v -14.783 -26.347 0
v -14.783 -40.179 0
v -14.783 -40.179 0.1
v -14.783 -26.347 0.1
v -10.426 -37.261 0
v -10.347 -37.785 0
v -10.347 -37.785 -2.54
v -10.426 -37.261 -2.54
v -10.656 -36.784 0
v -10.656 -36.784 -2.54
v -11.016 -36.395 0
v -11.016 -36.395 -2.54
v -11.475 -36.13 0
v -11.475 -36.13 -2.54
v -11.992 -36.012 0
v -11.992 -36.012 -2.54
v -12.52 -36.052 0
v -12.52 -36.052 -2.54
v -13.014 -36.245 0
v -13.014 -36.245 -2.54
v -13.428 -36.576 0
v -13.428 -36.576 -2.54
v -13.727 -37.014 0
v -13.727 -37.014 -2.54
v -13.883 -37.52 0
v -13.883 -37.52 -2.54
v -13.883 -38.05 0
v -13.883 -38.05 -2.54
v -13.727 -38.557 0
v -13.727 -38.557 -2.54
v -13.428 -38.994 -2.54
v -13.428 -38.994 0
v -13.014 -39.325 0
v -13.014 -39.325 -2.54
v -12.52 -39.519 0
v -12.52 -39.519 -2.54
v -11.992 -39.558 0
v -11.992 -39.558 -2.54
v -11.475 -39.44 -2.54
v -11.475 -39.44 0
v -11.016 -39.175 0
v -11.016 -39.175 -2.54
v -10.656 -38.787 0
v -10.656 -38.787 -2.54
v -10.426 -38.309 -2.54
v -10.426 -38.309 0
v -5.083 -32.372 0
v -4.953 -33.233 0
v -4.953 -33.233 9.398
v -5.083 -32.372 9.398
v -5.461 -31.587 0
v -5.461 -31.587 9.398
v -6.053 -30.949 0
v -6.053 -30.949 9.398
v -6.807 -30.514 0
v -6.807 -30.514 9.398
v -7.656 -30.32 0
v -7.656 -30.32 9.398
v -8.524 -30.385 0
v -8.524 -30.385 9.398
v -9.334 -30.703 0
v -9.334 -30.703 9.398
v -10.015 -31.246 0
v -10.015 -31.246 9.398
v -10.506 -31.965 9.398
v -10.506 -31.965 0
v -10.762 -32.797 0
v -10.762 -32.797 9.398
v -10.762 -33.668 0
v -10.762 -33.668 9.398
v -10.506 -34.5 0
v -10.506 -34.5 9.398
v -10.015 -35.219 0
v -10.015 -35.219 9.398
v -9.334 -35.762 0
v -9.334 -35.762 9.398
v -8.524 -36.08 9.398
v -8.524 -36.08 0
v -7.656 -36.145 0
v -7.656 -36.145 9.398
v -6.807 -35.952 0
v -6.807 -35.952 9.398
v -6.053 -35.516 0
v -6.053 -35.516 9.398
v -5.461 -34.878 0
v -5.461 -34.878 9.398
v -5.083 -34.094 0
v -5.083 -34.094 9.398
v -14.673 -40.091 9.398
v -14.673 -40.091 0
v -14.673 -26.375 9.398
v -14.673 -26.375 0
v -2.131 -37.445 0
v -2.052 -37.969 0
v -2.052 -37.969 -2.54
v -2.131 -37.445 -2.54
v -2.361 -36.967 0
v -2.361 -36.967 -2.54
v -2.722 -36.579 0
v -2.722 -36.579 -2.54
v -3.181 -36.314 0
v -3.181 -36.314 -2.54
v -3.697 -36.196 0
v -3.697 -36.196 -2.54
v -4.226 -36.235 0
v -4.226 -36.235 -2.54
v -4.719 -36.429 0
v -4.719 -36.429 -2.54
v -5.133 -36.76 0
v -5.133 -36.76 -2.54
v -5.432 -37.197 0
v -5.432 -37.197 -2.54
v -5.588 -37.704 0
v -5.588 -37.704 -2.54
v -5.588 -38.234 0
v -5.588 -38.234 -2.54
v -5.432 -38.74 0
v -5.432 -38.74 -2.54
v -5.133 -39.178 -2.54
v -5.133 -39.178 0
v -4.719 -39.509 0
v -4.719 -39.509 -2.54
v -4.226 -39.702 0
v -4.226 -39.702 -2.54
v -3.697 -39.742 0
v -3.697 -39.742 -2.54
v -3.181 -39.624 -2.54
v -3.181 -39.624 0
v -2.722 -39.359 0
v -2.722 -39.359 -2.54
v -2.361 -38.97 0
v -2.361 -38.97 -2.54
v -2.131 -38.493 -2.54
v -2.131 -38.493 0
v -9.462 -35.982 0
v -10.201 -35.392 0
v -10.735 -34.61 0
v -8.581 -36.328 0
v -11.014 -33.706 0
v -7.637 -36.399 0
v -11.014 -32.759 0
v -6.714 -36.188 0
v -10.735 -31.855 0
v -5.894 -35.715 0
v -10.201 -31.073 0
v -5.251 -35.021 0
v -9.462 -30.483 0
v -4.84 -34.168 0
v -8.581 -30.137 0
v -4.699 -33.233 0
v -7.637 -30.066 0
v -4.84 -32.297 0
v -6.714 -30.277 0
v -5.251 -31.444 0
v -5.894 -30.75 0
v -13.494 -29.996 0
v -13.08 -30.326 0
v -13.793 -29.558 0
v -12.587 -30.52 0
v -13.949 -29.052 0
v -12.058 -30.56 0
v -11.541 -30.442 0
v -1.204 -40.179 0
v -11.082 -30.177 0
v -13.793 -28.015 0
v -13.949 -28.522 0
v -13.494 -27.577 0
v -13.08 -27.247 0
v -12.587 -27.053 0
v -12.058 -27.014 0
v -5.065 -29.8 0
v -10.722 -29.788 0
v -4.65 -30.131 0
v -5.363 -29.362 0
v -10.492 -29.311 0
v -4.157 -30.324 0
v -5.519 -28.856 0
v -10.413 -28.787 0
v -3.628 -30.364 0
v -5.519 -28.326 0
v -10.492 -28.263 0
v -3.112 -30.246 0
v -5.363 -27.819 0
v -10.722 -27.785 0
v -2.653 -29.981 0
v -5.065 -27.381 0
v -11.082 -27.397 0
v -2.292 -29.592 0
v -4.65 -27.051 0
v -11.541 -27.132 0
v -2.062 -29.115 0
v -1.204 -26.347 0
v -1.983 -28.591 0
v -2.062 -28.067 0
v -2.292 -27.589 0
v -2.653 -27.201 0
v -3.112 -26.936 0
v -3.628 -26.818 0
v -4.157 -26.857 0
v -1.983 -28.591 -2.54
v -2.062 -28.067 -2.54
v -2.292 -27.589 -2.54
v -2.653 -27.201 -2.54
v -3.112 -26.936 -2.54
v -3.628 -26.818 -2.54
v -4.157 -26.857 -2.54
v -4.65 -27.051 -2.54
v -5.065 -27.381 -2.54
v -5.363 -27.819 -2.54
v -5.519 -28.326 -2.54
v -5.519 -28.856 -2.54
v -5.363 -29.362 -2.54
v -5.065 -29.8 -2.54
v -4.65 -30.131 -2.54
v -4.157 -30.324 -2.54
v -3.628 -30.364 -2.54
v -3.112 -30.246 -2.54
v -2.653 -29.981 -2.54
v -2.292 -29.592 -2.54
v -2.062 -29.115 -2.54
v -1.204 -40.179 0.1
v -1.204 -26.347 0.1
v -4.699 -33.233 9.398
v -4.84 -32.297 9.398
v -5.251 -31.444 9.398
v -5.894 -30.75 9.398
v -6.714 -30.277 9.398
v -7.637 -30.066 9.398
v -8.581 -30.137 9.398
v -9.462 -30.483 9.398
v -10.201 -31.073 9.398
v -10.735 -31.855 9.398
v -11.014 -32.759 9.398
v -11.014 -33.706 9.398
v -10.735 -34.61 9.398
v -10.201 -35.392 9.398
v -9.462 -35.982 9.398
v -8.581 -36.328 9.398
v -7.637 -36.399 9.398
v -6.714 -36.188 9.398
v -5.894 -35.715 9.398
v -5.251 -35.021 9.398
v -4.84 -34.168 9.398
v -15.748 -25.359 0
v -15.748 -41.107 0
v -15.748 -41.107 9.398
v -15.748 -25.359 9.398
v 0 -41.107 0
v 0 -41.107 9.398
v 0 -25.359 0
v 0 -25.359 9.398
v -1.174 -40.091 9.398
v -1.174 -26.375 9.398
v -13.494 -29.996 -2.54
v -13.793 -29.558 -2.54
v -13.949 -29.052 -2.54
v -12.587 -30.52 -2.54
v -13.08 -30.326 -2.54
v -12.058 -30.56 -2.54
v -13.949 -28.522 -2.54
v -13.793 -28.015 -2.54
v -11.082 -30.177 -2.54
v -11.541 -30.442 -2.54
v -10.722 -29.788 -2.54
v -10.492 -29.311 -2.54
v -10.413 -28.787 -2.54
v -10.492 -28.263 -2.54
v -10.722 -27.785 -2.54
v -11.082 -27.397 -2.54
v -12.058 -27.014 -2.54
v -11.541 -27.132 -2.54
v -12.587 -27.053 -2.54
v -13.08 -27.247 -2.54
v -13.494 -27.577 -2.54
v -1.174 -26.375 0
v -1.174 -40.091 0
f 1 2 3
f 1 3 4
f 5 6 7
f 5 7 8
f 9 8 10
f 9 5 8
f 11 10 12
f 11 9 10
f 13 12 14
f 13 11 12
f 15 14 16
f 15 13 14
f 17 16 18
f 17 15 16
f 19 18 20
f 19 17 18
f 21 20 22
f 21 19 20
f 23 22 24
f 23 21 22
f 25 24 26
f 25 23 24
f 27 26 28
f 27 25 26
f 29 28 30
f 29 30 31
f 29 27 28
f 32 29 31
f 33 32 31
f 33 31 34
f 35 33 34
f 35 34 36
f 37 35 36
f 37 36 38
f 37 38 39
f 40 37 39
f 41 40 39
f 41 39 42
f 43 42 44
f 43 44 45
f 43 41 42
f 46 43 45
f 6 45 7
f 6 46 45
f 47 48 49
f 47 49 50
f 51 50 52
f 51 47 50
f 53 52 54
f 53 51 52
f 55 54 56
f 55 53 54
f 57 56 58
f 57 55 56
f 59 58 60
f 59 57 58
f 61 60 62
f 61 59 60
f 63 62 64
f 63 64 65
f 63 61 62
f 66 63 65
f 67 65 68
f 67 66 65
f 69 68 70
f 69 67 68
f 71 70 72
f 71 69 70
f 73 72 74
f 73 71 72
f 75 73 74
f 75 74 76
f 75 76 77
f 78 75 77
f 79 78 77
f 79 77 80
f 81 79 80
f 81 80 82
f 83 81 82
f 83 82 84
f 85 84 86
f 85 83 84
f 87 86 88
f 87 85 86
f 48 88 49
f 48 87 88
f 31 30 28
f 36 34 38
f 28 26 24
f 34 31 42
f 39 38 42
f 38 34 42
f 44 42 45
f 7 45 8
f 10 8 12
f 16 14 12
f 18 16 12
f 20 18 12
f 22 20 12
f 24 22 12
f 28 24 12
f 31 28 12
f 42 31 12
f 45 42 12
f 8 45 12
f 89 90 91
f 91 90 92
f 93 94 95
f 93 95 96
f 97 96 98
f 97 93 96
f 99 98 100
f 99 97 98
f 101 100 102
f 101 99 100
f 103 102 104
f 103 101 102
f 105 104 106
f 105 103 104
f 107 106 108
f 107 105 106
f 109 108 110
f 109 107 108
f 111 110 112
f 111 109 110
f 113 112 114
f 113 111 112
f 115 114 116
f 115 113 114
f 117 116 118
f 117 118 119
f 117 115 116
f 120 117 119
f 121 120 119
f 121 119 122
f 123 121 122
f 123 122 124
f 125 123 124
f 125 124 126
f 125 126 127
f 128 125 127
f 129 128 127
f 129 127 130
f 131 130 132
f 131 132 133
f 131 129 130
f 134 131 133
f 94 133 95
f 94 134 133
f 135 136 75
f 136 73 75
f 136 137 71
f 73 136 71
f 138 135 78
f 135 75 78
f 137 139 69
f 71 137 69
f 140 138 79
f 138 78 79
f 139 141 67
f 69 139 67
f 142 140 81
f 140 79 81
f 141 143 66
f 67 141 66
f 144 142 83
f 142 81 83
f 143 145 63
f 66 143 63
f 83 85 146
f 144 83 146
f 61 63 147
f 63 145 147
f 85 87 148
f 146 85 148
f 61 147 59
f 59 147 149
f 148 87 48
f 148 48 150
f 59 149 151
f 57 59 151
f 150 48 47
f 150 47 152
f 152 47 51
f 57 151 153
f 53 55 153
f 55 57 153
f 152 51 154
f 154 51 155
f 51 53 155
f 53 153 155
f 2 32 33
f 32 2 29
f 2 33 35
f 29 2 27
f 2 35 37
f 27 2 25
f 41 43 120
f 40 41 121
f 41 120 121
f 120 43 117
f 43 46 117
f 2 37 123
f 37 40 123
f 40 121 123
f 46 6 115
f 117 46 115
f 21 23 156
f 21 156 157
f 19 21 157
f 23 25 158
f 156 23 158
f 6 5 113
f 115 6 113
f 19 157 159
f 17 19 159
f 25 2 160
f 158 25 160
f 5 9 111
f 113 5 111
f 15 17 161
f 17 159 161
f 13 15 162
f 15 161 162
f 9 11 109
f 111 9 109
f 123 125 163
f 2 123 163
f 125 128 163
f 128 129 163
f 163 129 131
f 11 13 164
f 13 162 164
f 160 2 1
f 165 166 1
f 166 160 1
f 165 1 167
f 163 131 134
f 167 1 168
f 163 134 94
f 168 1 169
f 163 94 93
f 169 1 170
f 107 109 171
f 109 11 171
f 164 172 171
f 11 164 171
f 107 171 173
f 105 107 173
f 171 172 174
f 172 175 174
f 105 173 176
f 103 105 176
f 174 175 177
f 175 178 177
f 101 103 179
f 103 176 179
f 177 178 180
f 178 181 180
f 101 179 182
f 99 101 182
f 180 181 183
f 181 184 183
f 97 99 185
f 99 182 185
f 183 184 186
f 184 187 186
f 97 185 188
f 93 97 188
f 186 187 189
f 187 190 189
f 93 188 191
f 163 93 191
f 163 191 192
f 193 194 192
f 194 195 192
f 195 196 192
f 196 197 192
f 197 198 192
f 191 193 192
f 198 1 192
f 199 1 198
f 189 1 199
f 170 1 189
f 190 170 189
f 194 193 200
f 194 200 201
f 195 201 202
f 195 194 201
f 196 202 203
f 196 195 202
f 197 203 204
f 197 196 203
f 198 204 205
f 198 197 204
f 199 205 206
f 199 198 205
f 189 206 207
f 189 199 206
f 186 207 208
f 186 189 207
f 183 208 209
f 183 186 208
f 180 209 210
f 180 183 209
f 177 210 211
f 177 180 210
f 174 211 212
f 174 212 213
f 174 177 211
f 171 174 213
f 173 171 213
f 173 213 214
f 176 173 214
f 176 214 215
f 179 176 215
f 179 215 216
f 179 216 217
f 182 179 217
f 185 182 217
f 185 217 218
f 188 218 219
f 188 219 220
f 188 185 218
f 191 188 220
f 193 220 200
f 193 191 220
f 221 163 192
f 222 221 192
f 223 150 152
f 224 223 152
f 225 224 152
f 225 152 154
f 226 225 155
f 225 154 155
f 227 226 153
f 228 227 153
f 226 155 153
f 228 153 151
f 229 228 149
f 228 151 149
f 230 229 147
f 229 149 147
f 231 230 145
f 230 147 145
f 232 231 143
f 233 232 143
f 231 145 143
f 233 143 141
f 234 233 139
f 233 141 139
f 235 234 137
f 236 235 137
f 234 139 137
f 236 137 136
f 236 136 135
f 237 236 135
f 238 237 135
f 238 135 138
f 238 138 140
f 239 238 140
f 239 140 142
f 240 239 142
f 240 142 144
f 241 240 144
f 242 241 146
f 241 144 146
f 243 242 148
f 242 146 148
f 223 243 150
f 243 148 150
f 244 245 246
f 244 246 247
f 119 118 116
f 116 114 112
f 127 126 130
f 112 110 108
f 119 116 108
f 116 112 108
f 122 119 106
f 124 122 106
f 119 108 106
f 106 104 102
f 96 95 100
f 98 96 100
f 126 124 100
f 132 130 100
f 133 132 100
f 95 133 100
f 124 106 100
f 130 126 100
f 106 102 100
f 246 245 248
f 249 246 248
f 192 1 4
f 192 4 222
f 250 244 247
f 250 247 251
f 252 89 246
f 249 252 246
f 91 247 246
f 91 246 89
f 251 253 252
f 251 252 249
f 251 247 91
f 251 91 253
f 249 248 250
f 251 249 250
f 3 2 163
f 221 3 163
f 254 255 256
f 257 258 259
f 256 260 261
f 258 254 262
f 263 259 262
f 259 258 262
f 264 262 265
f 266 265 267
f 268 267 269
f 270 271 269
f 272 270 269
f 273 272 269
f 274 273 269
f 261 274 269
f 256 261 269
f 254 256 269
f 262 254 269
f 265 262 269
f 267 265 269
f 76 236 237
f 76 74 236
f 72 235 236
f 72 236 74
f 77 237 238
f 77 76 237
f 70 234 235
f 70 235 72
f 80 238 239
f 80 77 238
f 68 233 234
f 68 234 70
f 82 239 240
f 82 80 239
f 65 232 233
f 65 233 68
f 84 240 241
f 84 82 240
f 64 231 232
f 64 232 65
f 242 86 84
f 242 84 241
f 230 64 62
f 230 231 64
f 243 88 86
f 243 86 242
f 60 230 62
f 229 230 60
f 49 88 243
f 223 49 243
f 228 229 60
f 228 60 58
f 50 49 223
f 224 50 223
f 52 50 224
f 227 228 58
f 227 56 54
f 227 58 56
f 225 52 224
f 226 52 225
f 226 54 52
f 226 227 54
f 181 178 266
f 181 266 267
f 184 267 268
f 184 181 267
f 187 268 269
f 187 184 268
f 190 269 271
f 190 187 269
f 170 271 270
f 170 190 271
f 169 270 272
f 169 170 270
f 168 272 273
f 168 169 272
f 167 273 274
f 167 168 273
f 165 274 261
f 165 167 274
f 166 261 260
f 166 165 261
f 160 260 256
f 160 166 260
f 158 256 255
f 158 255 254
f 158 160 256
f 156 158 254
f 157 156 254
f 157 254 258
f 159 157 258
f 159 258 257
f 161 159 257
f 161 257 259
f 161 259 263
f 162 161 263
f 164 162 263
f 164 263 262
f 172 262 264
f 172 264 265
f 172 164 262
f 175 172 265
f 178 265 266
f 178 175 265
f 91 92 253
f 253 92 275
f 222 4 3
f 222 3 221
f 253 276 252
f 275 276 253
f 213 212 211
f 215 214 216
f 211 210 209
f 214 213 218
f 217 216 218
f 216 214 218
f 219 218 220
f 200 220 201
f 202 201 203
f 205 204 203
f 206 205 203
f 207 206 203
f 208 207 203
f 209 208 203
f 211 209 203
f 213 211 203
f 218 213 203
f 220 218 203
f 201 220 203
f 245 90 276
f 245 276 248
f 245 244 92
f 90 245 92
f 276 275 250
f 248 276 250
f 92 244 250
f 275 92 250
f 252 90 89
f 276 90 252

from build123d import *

# Parameters (mm, degrees)
F0_W     = 15.748
F0_H     = 15.748
F0_W_2   = 13.499342
F0_H_2   = 13.716
F1_DEPTH = 9.398
F0_R     = 3.175
F0_R_2   = 2.921
F2_DEPTH = 9.398
F3_W     = 13.579066
F3_H     = 13.832018
F4_DEPTH = 0.1
F5_R     = 1.778
F6_DEPTH = 2.54


with BuildPart() as f1:
    # F0 (on Top) → F1 (new body)
    with BuildSketch(Plane.XY):
        with Locations((-7.874, -33.232593)):
            Rectangle(F0_W, F0_H)
        with Locations((-7.923433, -33.232593)):
            Rectangle(F0_W_2, F0_H_2, mode=Mode.SUBTRACT)
    extrude(amount=F1_DEPTH)


with BuildPart() as f2:
    # F0 (on Top) → F2 (new body)
    with BuildSketch(Plane.XY):
        with Locations((-7.874, -33.232593)):
            Circle(F0_R)
        with Locations((-7.874, -33.232593)):
            Circle(F0_R_2, mode=Mode.SUBTRACT)
    extrude(amount=F2_DEPTH)


with BuildPart() as f4:
    # F3 (on Top) → F4 (new body)
    with BuildSketch(Plane.XY):
        with Locations((-7.993951, -33.262994)):
            Rectangle(F3_W, F3_H)
    extrude(amount=F4_DEPTH)

    # F5 (on Top) → F6 (join)
    with BuildSketch(Plane.XY):
        with Locations((-3.830078, -37.968907)):
            Circle(F5_R)
        with Locations((-3.761275, -28.590713)):
            Circle(F5_R)
        with Locations((-12.190933, -28.78669)):
            Circle(F5_R)
        with Locations((-12.124785, -37.785119)):
            Circle(F5_R)
    extrude(amount=-F6_DEPTH)


solid = Compound([f1.part, f2.part, f4.part])
